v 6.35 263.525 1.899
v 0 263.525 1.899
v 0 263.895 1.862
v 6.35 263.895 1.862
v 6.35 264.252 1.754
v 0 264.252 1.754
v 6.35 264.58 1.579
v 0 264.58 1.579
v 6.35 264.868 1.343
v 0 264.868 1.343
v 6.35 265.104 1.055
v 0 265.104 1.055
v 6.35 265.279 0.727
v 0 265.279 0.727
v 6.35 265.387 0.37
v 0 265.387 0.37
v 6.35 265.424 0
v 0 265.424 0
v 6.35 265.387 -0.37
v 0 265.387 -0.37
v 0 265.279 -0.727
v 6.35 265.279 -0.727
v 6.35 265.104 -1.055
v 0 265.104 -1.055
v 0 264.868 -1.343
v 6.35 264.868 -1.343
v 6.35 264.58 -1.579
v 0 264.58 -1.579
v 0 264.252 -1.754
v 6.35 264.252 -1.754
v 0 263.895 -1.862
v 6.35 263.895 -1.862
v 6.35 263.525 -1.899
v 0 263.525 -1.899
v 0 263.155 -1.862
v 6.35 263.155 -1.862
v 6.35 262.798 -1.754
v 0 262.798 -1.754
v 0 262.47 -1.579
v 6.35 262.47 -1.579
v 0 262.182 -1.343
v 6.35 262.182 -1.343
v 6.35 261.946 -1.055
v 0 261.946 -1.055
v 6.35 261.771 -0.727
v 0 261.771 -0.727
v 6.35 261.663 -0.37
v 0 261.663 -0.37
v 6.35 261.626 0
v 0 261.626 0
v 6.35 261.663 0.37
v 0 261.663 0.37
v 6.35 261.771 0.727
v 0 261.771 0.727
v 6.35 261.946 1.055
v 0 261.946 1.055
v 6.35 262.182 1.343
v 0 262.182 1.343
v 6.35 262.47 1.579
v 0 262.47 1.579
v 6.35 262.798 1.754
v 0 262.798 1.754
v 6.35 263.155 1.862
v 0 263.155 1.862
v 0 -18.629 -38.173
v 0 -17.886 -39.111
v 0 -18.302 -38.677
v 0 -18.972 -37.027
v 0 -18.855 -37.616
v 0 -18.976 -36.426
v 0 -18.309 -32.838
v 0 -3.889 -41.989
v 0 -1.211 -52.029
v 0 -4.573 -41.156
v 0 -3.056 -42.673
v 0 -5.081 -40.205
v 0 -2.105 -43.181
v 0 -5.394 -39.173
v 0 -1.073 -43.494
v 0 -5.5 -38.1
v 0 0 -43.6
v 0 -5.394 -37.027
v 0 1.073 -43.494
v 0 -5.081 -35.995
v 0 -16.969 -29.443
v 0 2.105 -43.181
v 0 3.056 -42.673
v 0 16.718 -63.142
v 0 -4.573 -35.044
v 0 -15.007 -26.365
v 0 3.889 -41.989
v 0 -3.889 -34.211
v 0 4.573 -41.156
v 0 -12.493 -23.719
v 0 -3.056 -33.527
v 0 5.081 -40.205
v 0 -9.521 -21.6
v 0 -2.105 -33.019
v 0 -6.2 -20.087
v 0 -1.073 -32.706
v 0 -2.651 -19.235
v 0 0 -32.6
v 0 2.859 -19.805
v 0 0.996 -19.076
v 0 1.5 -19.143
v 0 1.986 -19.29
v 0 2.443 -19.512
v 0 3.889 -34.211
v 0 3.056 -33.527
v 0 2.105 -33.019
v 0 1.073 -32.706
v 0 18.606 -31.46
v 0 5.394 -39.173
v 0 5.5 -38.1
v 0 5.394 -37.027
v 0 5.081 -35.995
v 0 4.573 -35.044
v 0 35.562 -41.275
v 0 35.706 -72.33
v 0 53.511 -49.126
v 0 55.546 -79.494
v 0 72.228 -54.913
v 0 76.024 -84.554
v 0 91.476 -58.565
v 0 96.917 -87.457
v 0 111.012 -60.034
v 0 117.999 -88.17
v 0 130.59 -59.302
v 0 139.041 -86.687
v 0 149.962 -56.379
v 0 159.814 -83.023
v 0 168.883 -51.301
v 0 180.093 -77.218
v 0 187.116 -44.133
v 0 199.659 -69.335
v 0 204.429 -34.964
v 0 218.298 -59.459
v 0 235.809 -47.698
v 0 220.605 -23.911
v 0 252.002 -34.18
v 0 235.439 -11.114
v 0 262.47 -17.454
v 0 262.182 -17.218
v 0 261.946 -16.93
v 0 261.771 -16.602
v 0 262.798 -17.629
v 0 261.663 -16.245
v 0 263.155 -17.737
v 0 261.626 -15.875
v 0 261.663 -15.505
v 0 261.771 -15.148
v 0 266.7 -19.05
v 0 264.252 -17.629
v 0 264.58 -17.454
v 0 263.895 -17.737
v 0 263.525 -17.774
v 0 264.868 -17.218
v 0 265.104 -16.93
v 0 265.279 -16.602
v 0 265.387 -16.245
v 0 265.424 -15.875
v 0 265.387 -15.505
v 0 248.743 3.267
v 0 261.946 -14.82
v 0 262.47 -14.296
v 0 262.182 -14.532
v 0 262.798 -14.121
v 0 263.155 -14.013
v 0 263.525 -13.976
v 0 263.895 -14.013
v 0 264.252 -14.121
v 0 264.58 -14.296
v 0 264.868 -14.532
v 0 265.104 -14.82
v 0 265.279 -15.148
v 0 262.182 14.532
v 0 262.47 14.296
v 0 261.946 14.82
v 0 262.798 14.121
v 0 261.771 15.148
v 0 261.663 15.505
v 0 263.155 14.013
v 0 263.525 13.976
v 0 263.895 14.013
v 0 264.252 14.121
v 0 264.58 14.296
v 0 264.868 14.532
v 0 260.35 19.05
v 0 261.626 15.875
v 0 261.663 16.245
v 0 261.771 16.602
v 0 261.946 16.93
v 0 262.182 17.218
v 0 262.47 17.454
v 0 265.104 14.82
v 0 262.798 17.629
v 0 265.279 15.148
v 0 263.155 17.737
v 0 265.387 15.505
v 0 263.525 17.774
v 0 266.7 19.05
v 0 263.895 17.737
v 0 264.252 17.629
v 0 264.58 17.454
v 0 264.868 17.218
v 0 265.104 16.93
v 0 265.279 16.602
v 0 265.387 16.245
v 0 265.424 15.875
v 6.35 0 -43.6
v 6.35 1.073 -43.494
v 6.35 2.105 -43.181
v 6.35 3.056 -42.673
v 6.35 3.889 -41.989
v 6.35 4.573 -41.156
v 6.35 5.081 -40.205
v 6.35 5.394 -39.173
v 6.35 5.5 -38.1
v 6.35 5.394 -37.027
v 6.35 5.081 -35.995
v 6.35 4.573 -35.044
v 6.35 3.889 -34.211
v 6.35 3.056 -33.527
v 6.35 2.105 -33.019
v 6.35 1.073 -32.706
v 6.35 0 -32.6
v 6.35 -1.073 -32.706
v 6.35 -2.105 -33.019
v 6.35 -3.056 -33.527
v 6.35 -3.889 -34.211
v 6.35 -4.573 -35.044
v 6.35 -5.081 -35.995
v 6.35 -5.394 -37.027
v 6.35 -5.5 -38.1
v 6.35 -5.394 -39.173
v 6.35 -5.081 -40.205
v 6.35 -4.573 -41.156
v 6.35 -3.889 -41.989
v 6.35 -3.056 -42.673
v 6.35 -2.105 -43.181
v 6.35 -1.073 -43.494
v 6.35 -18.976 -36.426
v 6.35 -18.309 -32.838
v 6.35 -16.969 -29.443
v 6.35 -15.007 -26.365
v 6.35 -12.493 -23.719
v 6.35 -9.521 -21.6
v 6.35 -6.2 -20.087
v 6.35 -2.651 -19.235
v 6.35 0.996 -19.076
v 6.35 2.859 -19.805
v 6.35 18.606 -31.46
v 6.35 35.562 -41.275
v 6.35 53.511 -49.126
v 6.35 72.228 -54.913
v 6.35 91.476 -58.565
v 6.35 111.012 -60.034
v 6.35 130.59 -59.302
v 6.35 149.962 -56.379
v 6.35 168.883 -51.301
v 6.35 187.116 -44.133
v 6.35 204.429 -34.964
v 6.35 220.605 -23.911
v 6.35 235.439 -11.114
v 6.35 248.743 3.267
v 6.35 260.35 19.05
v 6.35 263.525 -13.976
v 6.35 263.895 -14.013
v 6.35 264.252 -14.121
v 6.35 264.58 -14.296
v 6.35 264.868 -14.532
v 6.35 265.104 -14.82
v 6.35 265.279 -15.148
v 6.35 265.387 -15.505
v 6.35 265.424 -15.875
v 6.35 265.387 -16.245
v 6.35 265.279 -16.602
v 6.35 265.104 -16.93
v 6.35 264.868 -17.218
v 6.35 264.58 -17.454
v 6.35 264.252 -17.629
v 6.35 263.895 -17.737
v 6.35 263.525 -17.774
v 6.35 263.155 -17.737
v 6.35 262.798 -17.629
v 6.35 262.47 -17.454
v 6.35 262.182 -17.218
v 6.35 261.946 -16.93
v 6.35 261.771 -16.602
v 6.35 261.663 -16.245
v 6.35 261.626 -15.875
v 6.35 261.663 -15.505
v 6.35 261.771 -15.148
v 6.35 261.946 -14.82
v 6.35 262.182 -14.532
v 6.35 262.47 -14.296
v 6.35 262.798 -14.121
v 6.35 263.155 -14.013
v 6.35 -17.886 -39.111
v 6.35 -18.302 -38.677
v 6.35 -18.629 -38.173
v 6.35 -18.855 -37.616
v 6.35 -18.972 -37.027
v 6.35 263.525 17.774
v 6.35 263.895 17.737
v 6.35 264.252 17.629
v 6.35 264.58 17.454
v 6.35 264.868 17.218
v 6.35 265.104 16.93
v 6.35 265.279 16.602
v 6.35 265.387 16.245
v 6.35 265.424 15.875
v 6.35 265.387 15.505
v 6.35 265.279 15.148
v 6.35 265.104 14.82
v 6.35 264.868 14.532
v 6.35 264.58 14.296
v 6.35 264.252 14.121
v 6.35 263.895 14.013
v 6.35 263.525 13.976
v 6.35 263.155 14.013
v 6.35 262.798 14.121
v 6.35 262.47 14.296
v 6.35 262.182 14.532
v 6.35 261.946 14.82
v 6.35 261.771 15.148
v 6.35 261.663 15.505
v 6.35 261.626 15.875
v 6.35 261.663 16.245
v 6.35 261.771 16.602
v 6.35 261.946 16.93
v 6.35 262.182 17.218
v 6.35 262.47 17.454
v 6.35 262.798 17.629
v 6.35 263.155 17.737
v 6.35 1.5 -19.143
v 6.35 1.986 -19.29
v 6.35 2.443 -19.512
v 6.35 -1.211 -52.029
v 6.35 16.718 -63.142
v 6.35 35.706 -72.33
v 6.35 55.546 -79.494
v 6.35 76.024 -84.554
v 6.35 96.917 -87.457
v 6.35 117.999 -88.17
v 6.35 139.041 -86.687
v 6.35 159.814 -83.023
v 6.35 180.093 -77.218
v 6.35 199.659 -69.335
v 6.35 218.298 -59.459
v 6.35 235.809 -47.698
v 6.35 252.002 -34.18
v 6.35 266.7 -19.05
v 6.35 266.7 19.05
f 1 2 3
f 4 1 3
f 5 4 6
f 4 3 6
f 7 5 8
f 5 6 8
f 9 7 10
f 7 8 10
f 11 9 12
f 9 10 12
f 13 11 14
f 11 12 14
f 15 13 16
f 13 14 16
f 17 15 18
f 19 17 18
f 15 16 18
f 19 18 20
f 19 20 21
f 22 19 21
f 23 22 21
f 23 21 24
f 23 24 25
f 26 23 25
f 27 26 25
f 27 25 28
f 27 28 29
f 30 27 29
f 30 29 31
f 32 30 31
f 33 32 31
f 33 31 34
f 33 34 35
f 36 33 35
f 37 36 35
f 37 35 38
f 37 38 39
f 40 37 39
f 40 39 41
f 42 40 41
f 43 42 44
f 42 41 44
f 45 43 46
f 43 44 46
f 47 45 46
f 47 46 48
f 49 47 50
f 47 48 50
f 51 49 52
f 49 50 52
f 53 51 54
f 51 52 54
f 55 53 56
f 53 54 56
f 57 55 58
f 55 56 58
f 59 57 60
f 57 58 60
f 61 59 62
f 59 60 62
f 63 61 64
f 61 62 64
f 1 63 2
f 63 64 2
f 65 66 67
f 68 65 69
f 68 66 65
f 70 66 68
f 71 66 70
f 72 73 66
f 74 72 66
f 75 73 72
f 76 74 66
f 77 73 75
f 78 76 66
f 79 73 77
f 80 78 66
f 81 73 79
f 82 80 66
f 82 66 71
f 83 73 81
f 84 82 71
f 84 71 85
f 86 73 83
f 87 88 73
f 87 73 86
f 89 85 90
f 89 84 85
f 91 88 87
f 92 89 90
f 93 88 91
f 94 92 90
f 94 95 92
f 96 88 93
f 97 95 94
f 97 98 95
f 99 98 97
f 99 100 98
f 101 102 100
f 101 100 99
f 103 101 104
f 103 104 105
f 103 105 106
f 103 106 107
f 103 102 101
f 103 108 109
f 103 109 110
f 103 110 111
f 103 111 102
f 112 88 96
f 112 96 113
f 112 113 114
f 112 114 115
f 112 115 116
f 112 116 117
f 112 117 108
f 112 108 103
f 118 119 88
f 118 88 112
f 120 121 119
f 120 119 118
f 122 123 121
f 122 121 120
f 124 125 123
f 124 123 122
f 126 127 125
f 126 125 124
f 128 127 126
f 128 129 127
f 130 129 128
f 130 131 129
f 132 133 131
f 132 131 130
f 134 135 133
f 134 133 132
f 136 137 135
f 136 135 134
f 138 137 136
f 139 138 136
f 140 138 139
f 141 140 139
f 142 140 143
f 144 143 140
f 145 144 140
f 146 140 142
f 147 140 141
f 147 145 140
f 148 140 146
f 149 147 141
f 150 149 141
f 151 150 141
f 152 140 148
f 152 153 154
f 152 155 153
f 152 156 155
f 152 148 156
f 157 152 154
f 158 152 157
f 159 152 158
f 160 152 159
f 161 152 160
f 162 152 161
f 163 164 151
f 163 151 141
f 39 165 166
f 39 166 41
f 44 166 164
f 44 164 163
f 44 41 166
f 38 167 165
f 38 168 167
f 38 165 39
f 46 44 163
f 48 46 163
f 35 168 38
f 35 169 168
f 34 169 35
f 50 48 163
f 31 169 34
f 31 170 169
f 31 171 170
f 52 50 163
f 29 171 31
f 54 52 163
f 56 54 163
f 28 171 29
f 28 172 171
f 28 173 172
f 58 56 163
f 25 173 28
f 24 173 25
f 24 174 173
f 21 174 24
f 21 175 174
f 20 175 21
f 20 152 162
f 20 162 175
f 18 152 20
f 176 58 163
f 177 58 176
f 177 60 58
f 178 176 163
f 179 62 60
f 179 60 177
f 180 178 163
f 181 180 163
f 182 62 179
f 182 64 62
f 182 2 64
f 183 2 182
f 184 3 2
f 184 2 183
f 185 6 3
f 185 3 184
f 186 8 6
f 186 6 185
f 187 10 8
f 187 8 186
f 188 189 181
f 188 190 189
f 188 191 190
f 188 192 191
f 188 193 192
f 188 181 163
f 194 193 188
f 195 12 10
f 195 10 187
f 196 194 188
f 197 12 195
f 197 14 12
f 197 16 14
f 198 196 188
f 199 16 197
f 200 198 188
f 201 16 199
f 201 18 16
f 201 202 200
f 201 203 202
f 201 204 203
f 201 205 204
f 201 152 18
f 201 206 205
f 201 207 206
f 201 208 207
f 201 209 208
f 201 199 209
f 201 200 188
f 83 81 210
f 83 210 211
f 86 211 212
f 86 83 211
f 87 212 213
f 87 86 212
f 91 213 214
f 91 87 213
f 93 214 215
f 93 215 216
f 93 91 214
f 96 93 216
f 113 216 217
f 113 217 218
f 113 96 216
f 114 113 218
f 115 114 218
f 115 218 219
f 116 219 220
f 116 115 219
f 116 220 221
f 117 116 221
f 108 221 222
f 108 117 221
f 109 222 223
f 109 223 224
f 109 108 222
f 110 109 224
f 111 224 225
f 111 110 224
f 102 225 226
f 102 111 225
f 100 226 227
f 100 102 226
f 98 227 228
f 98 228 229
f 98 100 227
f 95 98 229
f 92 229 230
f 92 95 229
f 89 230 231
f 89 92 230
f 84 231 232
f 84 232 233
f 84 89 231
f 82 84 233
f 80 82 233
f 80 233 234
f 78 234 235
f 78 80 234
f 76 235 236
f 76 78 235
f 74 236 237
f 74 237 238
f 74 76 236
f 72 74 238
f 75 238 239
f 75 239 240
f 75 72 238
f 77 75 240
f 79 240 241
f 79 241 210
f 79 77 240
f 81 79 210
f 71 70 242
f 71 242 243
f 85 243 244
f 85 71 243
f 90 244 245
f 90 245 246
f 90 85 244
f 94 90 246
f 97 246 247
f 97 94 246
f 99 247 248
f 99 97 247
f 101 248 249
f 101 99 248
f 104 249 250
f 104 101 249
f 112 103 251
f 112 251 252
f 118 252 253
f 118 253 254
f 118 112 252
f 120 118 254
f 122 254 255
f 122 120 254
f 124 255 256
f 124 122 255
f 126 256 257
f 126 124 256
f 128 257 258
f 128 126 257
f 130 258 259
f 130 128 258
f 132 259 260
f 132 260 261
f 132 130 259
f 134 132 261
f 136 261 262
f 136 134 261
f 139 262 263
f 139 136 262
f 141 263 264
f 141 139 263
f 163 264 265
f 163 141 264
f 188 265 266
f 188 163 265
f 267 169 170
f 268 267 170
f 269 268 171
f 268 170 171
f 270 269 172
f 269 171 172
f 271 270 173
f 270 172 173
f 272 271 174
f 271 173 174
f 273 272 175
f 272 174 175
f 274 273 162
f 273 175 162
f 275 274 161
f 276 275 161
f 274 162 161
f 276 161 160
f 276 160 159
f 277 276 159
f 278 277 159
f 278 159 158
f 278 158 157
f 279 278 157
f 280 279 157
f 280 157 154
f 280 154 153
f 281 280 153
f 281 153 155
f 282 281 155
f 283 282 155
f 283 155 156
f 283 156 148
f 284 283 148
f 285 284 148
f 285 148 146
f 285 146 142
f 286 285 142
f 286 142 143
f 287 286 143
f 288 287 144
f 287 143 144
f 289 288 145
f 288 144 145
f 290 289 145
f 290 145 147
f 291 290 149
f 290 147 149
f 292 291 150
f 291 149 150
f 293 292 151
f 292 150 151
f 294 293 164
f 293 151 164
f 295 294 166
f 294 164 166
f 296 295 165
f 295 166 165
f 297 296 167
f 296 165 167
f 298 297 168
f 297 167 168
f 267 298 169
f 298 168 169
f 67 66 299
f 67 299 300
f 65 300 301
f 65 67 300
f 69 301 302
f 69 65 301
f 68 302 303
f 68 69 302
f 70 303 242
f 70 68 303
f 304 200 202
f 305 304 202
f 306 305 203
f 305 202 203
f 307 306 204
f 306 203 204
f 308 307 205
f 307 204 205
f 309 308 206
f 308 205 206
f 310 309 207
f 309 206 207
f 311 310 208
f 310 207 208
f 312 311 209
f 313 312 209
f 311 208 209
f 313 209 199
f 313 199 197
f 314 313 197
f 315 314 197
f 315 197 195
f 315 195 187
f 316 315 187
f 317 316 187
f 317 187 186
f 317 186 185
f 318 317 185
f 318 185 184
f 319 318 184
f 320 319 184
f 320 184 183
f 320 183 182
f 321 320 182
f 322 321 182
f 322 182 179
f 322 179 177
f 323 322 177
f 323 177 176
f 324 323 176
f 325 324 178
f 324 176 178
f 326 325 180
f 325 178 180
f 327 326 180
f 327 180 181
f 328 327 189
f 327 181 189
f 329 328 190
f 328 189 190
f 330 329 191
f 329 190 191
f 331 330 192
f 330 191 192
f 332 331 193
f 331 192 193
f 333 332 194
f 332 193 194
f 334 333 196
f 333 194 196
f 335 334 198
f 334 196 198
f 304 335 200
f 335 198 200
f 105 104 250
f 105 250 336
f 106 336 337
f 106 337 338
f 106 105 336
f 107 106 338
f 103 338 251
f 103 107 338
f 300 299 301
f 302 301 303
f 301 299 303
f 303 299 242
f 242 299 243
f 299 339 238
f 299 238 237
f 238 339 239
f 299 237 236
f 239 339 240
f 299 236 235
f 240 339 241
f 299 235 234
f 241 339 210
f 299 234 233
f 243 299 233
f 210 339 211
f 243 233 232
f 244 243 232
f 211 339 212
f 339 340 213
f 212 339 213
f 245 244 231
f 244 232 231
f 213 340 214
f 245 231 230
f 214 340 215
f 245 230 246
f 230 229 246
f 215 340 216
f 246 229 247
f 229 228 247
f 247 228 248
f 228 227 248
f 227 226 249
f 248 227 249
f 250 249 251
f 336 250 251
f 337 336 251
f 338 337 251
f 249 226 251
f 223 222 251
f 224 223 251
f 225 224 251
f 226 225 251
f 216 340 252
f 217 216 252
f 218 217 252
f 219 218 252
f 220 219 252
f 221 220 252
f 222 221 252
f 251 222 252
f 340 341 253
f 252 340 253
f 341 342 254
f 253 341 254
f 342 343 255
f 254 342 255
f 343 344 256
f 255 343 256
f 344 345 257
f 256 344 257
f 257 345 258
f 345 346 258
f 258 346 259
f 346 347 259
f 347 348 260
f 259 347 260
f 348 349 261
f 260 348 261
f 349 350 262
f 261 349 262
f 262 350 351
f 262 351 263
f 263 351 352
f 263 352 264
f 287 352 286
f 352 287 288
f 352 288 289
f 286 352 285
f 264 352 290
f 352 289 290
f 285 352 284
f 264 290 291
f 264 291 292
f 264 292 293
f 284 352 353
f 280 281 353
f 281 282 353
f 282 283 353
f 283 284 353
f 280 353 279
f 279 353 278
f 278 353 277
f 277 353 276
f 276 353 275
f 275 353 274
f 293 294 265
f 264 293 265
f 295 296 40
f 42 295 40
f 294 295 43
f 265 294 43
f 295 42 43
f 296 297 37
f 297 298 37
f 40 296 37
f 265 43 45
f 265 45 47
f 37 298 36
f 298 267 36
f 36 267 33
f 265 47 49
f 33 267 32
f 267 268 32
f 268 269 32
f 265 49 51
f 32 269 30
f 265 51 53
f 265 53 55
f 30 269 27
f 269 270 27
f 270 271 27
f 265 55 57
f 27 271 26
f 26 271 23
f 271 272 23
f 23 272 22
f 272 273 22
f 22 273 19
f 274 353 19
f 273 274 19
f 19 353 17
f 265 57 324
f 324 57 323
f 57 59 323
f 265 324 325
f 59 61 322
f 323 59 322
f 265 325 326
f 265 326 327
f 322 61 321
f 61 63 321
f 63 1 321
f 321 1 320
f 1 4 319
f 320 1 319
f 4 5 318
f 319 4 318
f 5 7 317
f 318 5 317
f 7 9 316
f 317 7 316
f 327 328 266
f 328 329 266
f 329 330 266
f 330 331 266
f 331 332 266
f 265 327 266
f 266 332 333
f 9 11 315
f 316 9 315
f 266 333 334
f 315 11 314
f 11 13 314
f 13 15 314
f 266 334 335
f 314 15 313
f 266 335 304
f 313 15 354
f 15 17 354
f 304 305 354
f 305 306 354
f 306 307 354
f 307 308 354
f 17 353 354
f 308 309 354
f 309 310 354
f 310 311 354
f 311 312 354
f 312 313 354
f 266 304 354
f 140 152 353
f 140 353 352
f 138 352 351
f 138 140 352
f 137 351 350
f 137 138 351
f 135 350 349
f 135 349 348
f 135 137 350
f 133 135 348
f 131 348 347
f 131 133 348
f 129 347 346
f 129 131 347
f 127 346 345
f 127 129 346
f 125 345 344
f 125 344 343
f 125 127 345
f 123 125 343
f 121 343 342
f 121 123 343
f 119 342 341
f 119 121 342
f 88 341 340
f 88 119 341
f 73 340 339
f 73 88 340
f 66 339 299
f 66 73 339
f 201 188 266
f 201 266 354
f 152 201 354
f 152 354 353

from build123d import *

# Parameters (mm, degrees)
SKETCH1_R                 = 5.5
BOSS_EXTRUDE1_DEPTH       = 6.35
F_6_CLEARANCE_HOLE1_D     = 3.7973
F_6_CLEARANCE_HOLE1_DEPTH = 6.35


with BuildPart() as part:
    # Sketch1 → Boss-Extrude1 (new body)
    with BuildSketch(Plane(origin=(0, 0, 0), x_dir=(0, 0, -1), z_dir=(1, 0, 0))):
        with BuildLine():
            Line((-19.05, 266.7), (19.05, 266.7))
            ThreePointArc((19.05, 266.7), (87.703033087, 128.539281009), (39.110598571, -17.88612161))
            ThreePointArc((39.110598571, -17.88612161), (37.900092771, -18.755241175), (36.426387255, -18.976341069))
            ThreePointArc((36.426387255, -18.976341069), (23.718766847, -12.493303526), (19.076049666, 0.995898429))
            ThreePointArc((19.076049666, 0.995898429), (19.289830149, 1.986417864), (19.804803607, 2.859133845))
            ThreePointArc((19.804803607, 2.859133845), (58.113146317, 140.316763388), (-19.05, 260.35))
            Line((-19.05, 260.35), (-19.05, 266.7))
        make_face()
        with Locations((38.1, 0)):
            Circle(SKETCH1_R, mode=Mode.SUBTRACT)
    extrude(amount=BOSS_EXTRUDE1_DEPTH)

    # #6 Clearance Hole1
    with Locations(Plane(origin=(6.35, 0, 0), x_dir=(0, 0, -1), z_dir=(1, 0, 0))):
        with Locations((-15.875, 263.525), (0, 263.525), (15.875, 263.525)):
            Hole(F_6_CLEARANCE_HOLE1_D / 2, depth=F_6_CLEARANCE_HOLE1_DEPTH)


solid = part.part
